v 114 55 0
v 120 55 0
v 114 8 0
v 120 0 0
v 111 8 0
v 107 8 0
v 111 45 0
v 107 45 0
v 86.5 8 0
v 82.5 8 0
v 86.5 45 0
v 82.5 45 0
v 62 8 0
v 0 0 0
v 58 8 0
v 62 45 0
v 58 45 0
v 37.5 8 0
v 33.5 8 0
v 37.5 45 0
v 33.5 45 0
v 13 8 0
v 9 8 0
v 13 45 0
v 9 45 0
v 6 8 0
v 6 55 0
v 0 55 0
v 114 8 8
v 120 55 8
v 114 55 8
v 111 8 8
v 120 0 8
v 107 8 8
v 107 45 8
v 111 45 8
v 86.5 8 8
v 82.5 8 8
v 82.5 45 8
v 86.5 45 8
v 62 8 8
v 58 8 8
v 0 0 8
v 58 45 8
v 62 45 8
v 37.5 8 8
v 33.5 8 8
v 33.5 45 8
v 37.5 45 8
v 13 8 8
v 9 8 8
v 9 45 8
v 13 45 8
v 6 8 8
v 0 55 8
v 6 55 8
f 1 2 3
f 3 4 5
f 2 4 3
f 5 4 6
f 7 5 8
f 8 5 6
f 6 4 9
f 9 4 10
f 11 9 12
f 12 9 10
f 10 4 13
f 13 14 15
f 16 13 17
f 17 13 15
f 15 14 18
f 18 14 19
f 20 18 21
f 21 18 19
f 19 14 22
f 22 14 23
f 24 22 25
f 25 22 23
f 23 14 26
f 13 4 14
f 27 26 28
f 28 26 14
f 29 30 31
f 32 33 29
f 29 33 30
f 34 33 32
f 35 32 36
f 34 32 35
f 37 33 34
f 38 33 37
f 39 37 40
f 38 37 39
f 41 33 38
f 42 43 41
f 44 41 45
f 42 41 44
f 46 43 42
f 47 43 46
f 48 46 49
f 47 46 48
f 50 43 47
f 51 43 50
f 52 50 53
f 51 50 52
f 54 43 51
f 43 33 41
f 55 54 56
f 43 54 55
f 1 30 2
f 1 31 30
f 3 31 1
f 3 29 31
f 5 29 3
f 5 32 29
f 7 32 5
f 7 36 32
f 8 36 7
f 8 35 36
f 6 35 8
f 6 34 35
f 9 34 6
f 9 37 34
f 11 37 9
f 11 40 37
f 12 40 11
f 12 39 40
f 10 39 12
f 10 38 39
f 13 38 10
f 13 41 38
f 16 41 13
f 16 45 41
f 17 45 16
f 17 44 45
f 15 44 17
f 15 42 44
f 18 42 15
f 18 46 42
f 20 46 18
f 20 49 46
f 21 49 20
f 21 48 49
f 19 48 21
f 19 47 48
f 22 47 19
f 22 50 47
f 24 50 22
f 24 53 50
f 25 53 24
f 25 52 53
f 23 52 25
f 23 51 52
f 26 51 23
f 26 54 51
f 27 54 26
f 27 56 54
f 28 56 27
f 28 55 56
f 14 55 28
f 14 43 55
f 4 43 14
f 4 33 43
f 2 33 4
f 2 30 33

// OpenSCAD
$fn = 32;

// ----------------------------------------------------------------------
// Guard grille: 5 slats over a 120 x 55 mm plate
// ----------------------------------------------------------------------

// --- parameters (mm) ---
profile_height = 8;       // extrusion height
profile_points = 28;      // points of the closed outline

profile = [[0, 0], [120, 0], [120, 55], [114, 55], [114, 8], [111, 8], [111, 45], [107, 45], [107, 8], [86.5, 8], [86.5, 45], [82.5, 45], [82.5, 8], [62, 8], [62, 45], [58, 45], [58, 8], [37.5, 8], [37.5, 45], [33.5, 45], [33.5, 8], [13, 8], [13, 45], [9, 45], [9, 8], [6, 8], [6, 55], [0, 55]];  // single closed polygon, 28 points, counter clockwise

// --- the one profile operation ---
linear_extrude(height = profile_height) polygon(points = profile);
